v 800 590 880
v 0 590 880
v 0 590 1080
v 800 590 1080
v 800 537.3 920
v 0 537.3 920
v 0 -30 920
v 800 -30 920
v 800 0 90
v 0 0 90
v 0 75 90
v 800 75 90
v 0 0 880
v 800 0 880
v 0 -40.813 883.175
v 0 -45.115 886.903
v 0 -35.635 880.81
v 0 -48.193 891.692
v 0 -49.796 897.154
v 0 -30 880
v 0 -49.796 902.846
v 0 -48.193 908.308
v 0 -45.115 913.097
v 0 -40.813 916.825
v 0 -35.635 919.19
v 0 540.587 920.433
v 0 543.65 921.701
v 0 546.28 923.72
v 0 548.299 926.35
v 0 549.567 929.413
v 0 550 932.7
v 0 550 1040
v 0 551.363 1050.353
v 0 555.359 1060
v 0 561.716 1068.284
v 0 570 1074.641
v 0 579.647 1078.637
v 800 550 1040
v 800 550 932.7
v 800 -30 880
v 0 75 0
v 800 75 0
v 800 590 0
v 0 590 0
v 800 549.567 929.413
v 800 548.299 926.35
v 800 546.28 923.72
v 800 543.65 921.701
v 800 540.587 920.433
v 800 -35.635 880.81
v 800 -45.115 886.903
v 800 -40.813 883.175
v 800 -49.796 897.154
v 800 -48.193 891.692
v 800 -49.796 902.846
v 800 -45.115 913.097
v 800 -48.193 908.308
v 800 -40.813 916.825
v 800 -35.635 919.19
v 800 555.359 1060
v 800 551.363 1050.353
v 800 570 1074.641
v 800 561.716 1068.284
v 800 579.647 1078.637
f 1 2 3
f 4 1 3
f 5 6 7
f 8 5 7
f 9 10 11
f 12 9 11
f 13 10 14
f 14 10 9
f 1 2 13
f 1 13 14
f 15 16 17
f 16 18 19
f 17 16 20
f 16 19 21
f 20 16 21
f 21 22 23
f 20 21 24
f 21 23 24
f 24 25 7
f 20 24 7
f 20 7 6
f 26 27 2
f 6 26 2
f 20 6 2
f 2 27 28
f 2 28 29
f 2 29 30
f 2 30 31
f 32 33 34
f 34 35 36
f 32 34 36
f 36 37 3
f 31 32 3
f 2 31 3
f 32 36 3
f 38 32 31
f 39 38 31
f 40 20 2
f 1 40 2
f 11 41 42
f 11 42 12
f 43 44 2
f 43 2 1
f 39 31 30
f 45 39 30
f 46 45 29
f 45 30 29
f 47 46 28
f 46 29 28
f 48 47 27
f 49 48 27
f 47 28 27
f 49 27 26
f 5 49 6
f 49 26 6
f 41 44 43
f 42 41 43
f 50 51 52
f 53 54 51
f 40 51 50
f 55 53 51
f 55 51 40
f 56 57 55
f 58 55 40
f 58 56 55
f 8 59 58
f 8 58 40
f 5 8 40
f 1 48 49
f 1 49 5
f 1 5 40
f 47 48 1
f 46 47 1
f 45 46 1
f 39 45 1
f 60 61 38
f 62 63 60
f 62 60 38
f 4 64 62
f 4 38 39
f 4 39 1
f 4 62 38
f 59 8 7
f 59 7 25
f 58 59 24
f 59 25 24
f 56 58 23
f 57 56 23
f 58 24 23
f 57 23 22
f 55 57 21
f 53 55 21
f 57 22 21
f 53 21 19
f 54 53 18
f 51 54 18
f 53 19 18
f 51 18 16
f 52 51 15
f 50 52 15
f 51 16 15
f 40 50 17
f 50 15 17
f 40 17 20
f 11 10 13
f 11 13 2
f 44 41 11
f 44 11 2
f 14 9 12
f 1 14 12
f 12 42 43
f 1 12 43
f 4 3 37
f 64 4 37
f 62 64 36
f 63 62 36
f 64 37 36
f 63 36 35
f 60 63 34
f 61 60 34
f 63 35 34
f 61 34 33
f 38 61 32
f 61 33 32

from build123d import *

# Parameters (mm, degrees)
F0_W     = 800
F0_H     = 590
F1_DEPTH = 880
F2_W     = 75
F2_H     = 90
F3_DEPTH = 800.001
F5_DEPTH = 800


with BuildPart() as f1:
    # F0 (on Top) → F1 (new body)
    with BuildSketch(Plane.XY):
        with Locations((400, 295)):
            Rectangle(F0_W, F0_H)
    extrude(amount=F1_DEPTH)

    # F2 (on Right) → F3 (cut, through all)
    with BuildSketch(Plane.YZ):
        with Locations((37.5, 45)):
            Rectangle(F2_W, F2_H)
    extrude(amount=F3_DEPTH, mode=Mode.SUBTRACT)


with BuildPart() as f5:
    # F4 (on Right) → F5 (new body, through all)
    with BuildSketch(Plane.YZ):
        with BuildLine():
            Line((-30, 880), (590, 880))
            Line((590, 880), (590, 1080))
            ThreePointArc((590, 1080), (561.715729, 1068.284271), (550, 1040))
            Line((550, 1040), (550, 932.7))
            ThreePointArc((550, 932.7), (546.280256, 923.719744), (537.3, 920))
            Line((537.3, 920), (-30, 920))
            ThreePointArc((-30, 920), (-50, 900), (-30, 880))
        make_face()
    extrude(amount=F5_DEPTH)


solid = Compound([f1.part, f5.part])
